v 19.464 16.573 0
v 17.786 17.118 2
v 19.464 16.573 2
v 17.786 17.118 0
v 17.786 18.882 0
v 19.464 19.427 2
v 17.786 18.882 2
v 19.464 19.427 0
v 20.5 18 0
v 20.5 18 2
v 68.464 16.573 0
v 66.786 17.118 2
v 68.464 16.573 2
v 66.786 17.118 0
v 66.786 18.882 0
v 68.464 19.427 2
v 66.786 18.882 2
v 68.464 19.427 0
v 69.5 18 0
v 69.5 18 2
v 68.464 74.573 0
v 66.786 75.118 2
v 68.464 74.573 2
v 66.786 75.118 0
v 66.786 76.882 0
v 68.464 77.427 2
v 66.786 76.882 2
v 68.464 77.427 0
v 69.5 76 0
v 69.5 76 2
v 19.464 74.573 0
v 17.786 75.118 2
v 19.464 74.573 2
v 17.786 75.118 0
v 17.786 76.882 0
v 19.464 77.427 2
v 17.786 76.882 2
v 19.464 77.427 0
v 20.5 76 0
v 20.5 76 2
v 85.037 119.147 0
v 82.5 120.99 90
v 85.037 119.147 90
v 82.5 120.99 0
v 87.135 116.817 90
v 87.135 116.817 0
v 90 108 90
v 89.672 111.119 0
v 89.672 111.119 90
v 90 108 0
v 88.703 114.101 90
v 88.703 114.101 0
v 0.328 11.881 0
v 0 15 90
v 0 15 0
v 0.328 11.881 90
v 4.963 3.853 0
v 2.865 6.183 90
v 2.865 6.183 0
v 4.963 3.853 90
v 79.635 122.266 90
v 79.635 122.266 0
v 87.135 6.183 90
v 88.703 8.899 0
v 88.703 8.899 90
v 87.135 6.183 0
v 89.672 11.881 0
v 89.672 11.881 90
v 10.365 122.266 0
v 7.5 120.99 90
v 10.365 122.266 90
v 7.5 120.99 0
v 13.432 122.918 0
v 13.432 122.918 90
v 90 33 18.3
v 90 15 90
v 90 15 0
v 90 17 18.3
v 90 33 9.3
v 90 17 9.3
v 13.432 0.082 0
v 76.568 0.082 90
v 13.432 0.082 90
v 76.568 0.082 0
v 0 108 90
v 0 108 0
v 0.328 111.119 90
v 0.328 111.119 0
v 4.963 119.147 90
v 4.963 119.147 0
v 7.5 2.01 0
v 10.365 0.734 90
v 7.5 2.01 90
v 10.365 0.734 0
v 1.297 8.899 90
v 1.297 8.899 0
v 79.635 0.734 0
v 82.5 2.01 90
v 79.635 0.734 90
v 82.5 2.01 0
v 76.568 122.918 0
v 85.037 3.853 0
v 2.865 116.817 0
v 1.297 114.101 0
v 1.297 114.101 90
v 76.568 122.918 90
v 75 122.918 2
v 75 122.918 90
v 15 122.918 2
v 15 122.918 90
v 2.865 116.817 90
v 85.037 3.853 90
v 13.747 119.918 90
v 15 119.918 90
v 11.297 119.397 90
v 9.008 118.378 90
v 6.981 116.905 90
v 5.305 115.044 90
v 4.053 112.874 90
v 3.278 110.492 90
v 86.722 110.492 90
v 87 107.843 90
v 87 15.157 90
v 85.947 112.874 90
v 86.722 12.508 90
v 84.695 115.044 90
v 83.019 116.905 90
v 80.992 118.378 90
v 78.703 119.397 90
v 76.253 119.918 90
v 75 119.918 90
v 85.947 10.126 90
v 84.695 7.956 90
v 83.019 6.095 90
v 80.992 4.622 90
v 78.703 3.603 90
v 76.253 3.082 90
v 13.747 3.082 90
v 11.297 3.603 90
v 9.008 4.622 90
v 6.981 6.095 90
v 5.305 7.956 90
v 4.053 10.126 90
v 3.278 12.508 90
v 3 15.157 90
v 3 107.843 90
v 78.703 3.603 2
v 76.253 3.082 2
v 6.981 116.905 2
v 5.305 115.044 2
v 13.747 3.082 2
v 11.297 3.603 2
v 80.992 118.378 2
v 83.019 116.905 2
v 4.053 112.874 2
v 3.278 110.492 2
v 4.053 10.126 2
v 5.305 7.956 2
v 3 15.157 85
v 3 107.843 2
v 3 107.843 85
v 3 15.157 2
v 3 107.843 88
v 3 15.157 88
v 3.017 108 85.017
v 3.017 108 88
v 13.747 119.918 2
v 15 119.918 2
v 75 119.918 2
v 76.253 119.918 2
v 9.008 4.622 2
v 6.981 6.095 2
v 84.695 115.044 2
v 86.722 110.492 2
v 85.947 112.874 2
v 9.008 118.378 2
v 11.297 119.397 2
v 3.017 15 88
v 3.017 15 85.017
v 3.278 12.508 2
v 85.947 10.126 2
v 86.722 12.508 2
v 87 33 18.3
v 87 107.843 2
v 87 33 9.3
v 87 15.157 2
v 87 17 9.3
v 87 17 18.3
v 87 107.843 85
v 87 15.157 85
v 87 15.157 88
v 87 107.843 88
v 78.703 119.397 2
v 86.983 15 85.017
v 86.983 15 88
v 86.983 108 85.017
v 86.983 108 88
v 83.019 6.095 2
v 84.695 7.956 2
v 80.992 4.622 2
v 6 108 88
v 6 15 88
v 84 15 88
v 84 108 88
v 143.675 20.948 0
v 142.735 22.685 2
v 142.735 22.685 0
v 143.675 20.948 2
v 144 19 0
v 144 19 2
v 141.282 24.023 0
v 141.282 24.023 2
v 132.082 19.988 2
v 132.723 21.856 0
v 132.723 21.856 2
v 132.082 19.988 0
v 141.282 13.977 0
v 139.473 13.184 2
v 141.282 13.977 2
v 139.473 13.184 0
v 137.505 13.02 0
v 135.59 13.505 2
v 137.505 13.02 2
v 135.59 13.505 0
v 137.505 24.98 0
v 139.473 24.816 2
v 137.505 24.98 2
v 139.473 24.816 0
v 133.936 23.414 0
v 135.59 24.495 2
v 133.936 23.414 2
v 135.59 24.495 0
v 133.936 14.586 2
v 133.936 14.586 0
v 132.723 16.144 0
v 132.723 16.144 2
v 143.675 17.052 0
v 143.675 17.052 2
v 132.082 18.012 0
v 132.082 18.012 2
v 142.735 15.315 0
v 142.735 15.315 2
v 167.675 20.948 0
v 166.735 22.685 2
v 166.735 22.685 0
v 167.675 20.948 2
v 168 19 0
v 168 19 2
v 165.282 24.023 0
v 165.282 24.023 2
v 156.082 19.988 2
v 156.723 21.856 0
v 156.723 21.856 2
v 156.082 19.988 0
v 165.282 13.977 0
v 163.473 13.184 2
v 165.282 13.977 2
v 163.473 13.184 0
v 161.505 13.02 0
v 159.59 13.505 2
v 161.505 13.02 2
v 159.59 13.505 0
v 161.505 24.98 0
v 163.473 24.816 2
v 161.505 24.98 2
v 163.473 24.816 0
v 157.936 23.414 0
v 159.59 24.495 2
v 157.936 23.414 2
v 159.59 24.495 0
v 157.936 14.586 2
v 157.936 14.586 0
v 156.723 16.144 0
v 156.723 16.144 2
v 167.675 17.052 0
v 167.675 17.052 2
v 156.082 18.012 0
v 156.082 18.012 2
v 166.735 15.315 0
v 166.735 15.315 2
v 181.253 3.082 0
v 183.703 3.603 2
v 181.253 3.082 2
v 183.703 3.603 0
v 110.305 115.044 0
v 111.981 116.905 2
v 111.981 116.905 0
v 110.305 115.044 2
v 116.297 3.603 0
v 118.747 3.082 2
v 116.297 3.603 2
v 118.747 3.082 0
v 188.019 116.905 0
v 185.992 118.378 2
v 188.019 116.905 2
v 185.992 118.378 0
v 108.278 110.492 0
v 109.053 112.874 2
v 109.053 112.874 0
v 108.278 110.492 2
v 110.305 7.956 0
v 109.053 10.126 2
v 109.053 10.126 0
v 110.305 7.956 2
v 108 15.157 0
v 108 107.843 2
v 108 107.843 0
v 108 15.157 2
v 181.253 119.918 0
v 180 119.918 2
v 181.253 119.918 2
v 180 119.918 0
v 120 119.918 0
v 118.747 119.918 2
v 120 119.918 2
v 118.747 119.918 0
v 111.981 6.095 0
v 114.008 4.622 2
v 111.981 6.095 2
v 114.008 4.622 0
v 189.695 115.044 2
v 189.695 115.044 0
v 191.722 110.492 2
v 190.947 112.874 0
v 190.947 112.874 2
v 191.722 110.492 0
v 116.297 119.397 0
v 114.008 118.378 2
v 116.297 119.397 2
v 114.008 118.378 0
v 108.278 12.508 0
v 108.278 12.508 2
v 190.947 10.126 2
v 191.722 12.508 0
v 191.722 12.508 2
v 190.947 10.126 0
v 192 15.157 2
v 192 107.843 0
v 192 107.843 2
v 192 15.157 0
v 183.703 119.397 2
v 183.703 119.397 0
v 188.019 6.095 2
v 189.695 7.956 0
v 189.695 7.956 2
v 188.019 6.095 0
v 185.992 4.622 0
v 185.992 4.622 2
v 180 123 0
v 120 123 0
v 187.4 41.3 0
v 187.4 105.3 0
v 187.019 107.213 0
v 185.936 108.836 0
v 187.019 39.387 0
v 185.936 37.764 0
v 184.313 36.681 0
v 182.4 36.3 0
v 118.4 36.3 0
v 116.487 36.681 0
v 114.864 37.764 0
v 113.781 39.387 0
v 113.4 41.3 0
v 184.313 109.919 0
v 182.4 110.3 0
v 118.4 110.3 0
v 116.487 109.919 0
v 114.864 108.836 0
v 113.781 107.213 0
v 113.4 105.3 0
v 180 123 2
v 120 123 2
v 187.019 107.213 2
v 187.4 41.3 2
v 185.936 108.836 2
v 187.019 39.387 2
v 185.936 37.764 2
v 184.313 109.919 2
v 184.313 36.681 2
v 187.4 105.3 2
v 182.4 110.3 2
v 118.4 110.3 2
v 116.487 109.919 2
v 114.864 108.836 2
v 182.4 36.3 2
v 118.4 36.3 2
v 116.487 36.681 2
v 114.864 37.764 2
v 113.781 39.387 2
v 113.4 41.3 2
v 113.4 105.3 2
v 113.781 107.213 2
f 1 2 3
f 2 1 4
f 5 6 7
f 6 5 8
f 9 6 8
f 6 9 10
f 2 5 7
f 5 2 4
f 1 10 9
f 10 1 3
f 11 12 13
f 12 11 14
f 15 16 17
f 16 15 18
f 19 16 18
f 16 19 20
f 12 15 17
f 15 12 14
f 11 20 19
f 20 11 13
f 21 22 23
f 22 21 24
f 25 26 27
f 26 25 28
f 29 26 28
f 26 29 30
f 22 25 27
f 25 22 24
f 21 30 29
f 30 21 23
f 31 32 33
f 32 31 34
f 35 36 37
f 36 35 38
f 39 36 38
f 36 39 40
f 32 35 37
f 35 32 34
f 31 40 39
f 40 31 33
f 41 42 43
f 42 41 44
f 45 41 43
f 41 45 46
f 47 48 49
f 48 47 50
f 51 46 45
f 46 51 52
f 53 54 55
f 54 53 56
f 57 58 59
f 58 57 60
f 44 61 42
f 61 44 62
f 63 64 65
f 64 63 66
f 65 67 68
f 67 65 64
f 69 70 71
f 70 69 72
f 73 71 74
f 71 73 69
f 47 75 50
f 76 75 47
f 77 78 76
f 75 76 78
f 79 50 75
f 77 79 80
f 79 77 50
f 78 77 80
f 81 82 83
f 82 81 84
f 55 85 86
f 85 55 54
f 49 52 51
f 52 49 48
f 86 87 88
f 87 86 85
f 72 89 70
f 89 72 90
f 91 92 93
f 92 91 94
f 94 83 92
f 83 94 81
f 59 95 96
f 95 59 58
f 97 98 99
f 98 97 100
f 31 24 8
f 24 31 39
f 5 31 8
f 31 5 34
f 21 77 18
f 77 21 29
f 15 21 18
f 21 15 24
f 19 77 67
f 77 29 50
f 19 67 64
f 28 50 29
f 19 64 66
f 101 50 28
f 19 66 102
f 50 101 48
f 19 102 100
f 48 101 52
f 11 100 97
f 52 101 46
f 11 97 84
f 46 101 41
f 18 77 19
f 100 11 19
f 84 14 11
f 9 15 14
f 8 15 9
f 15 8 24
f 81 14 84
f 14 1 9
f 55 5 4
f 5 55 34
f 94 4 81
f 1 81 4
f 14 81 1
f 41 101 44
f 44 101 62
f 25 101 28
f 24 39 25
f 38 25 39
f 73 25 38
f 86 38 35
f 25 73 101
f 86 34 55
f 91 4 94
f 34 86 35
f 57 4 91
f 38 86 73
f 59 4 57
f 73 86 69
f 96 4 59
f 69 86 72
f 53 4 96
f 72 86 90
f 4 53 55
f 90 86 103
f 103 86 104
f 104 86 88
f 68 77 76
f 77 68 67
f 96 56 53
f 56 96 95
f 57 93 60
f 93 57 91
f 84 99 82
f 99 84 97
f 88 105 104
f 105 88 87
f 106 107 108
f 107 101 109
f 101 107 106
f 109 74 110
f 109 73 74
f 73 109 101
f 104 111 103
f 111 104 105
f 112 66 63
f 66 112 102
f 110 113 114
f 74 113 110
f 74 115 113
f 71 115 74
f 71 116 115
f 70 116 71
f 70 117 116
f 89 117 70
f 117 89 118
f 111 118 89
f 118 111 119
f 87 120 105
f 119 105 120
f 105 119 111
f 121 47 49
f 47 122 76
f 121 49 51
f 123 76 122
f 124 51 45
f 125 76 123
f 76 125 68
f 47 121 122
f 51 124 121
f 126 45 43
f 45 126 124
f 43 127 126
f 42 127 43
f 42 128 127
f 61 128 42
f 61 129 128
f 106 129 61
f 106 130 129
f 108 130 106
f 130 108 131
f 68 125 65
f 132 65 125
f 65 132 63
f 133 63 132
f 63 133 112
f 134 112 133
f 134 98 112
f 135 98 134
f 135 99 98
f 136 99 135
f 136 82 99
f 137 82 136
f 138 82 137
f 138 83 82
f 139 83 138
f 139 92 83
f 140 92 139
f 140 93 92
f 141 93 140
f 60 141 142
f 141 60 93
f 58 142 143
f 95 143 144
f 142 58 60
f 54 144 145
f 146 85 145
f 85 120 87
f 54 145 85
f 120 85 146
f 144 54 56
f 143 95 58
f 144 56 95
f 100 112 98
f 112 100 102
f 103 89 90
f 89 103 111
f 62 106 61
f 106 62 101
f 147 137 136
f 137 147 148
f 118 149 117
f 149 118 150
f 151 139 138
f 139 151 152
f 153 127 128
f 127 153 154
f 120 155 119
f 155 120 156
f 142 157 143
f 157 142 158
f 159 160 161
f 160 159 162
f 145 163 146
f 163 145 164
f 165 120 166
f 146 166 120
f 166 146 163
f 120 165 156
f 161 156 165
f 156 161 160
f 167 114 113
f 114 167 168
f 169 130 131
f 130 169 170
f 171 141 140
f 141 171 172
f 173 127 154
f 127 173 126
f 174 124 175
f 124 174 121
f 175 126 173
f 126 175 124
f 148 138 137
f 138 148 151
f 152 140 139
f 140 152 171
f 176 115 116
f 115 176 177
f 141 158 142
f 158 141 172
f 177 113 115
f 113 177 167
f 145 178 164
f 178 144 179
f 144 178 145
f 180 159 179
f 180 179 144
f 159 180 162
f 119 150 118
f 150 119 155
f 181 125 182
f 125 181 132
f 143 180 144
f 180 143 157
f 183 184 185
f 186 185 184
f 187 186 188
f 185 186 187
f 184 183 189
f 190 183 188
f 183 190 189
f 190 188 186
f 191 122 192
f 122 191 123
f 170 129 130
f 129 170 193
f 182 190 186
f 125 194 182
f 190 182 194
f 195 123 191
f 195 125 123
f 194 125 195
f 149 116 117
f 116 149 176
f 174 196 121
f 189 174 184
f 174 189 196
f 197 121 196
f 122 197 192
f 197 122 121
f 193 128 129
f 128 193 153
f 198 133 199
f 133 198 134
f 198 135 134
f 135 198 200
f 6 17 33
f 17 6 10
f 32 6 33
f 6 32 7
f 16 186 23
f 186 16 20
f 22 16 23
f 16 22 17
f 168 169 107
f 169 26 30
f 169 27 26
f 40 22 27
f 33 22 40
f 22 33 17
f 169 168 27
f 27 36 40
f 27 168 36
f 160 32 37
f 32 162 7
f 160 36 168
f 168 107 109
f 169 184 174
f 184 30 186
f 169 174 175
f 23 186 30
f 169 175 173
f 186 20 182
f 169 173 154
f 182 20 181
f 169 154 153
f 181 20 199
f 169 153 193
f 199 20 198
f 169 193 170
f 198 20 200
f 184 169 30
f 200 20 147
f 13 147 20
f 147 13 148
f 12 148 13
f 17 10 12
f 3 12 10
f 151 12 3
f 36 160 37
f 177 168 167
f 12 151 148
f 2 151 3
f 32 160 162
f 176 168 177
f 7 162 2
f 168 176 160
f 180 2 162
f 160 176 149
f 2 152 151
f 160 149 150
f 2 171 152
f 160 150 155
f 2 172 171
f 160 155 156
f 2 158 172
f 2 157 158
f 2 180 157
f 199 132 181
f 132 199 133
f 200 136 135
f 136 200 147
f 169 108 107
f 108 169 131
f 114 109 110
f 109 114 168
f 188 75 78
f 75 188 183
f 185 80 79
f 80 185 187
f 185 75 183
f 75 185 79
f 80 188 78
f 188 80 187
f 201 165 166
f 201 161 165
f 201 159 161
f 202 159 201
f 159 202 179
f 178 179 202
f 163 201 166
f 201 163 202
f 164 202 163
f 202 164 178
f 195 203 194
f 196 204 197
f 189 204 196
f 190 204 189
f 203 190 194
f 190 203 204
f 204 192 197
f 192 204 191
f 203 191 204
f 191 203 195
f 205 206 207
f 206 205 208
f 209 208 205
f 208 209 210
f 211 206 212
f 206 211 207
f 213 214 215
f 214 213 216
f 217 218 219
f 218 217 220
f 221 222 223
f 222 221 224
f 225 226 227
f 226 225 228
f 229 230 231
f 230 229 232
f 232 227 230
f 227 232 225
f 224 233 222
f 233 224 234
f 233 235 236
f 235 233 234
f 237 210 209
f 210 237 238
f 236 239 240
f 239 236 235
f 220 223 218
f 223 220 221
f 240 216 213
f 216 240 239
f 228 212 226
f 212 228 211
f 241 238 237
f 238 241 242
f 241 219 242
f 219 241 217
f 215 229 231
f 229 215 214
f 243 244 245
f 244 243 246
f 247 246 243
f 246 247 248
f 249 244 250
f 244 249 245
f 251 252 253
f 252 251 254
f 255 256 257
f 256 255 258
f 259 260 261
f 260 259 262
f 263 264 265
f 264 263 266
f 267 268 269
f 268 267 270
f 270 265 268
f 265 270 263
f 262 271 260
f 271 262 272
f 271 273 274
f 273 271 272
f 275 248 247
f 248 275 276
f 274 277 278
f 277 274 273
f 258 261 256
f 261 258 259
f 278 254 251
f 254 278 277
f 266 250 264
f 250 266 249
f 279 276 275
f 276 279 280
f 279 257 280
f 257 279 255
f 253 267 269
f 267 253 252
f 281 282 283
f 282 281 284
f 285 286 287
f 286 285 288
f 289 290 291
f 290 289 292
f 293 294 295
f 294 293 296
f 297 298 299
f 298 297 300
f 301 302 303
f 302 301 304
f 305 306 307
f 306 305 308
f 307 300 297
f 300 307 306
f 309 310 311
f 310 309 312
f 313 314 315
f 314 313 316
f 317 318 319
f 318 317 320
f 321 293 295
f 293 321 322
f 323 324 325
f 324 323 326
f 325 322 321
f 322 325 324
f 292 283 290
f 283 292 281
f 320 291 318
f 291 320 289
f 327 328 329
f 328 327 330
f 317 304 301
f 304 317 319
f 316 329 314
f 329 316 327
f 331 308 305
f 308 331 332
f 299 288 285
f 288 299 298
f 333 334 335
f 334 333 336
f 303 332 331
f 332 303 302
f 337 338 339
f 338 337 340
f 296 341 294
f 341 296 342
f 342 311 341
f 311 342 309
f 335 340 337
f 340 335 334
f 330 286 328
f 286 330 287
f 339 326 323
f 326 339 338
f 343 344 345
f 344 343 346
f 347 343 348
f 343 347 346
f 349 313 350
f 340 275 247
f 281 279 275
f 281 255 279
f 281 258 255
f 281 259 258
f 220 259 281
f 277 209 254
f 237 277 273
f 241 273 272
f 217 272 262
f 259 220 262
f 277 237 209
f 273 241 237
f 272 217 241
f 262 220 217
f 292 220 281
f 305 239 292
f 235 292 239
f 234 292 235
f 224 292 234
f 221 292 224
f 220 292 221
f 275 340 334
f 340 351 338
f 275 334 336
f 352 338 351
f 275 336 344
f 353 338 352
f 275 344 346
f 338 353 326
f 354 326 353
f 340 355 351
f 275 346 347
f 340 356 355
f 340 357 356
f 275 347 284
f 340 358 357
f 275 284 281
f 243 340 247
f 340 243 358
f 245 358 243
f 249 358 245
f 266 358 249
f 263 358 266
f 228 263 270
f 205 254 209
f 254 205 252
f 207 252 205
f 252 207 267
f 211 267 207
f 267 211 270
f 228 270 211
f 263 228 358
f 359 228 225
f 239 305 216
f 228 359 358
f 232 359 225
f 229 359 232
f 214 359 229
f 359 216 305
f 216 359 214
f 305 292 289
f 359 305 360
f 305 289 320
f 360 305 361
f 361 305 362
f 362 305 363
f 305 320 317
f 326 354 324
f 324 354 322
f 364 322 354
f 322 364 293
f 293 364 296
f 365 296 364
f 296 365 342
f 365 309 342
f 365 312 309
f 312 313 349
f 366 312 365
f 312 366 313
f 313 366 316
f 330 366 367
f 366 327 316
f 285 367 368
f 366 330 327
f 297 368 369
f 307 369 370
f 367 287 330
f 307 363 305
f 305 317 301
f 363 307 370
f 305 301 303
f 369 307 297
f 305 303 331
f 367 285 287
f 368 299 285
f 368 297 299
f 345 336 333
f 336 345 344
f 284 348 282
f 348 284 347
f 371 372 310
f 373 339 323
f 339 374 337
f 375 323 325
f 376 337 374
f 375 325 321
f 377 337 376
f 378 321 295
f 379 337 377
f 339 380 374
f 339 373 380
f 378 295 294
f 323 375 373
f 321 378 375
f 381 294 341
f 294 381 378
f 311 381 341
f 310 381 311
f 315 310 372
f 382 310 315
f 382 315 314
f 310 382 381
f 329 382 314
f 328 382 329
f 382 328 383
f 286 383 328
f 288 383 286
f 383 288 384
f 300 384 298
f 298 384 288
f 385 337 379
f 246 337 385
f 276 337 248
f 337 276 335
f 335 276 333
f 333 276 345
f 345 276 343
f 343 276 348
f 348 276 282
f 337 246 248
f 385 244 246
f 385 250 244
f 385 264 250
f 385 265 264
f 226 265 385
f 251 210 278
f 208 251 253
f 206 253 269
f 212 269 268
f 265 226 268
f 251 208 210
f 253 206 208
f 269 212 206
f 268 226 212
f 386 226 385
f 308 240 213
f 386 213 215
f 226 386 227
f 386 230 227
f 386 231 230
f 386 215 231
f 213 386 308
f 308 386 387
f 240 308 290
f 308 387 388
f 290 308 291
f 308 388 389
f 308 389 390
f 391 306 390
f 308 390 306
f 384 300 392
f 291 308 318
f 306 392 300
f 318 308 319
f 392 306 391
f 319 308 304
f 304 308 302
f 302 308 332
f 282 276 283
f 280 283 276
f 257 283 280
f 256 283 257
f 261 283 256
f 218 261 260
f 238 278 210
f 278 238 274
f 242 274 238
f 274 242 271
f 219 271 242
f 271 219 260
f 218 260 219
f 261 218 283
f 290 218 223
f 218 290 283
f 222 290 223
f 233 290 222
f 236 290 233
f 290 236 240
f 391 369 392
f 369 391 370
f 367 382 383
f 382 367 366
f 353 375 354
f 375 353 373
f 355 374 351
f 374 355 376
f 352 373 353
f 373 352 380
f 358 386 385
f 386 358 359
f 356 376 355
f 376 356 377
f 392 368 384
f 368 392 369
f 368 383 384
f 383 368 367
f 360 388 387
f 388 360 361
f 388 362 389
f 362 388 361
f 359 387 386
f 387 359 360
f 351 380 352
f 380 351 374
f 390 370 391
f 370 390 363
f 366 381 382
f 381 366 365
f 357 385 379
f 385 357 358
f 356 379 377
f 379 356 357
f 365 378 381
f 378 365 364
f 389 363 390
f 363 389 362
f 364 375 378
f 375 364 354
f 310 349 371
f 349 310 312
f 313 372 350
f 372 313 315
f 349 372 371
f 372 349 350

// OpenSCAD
/* CryptoFaxPA
   License: AGPLv3 */

SIZE = [90, 123, 90];
ANGLE_RADIUS = 15;
BOTTOM_THICKNESS = 2;
LID_THICKNESS = 2;
WALL_THICKNESS = 3;
SHELF_DEPTH = 3;
BUTTONS_DIAMETER = 12;

box();

translate([SIZE[0] + 15, 0, 0])
  lid();

module lid() {
  difference() {
     // main plate
     linear_extrude(height = LID_THICKNESS)
        offset(r = -WALL_THICKNESS)
          rounded_square(SIZE, ANGLE_RADIUS);
      
      // button holes
      for (o = [[33,19,-0.1],[57,19,-0.1]])
        translate(o)
          cylinder(d = BUTTONS_DIAMETER, h = LID_THICKNESS+0.2);
      
      // printer hole
      translate([8.4,36.3,-0.1])
        linear_extrude(height = LID_THICKNESS+0.2)
          rounded_square([74,74], 5);
  };
  
  // top of the rear opening
  translate([ANGLE_RADIUS, SIZE[1]-WALL_THICKNESS-0.1, 0])
    cube([SIZE[0] - ANGLE_RADIUS*2, WALL_THICKNESS+0.1, BOTTOM_THICKNESS]);
}

module box() {
  difference() {
    // external shape
    linear_extrude(height = SIZE[2])
      rounded_square(SIZE, ANGLE_RADIUS);
    
    // internal void
    translate([0,0,BOTTOM_THICKNESS])
      linear_extrude(height = SIZE[2])
        offset(r = -WALL_THICKNESS)
          rounded_square(SIZE, ANGLE_RADIUS);
    
    // rear window
    translate([15,SIZE[1]-WALL_THICKNESS-0.1,BOTTOM_THICKNESS])
      cube([SIZE[0] - ANGLE_RADIUS*2, 10, SIZE[2]]);
    
    // USB port hole
    translate([SIZE[0]-WALL_THICKNESS-0.1, 17, 9.3])
      cube([WALL_THICKNESS+0.2, 16, 9]);
    
    // Raspberry PI mounting holes
    for (o = [[0,0], [49,0], [49,58], [0,58]])
      translate(o)
        translate([19,18,-0.1])
          cylinder(d = 3, h = BOTTOM_THICKNESS+0.2);
  };
  
  // lid shelves
  translate([WALL_THICKNESS, ANGLE_RADIUS, SIZE[2]-LID_THICKNESS])
    lid_mount(SHELF_DEPTH, SIZE[1] - ANGLE_RADIUS*2);
  translate([SIZE[0]-WALL_THICKNESS, SIZE[1] - ANGLE_RADIUS, SIZE[2]-LID_THICKNESS])
    rotate(180)
       lid_mount(SHELF_DEPTH, SIZE[1] - ANGLE_RADIUS*2);
}
module rounded_square(s, r) {
    translate([r,r])
      minkowski() {
          square([s[0] - 2*r, s[1] - 2*r]);
          circle(r);
      }
}

module lid_mount(d, l) {
   translate([0,l,-d])
     rotate([90,0,0])
        linear_extrude(height = l)
           polygon(points = [[0,d], [d,d], [0,0]]);
}
